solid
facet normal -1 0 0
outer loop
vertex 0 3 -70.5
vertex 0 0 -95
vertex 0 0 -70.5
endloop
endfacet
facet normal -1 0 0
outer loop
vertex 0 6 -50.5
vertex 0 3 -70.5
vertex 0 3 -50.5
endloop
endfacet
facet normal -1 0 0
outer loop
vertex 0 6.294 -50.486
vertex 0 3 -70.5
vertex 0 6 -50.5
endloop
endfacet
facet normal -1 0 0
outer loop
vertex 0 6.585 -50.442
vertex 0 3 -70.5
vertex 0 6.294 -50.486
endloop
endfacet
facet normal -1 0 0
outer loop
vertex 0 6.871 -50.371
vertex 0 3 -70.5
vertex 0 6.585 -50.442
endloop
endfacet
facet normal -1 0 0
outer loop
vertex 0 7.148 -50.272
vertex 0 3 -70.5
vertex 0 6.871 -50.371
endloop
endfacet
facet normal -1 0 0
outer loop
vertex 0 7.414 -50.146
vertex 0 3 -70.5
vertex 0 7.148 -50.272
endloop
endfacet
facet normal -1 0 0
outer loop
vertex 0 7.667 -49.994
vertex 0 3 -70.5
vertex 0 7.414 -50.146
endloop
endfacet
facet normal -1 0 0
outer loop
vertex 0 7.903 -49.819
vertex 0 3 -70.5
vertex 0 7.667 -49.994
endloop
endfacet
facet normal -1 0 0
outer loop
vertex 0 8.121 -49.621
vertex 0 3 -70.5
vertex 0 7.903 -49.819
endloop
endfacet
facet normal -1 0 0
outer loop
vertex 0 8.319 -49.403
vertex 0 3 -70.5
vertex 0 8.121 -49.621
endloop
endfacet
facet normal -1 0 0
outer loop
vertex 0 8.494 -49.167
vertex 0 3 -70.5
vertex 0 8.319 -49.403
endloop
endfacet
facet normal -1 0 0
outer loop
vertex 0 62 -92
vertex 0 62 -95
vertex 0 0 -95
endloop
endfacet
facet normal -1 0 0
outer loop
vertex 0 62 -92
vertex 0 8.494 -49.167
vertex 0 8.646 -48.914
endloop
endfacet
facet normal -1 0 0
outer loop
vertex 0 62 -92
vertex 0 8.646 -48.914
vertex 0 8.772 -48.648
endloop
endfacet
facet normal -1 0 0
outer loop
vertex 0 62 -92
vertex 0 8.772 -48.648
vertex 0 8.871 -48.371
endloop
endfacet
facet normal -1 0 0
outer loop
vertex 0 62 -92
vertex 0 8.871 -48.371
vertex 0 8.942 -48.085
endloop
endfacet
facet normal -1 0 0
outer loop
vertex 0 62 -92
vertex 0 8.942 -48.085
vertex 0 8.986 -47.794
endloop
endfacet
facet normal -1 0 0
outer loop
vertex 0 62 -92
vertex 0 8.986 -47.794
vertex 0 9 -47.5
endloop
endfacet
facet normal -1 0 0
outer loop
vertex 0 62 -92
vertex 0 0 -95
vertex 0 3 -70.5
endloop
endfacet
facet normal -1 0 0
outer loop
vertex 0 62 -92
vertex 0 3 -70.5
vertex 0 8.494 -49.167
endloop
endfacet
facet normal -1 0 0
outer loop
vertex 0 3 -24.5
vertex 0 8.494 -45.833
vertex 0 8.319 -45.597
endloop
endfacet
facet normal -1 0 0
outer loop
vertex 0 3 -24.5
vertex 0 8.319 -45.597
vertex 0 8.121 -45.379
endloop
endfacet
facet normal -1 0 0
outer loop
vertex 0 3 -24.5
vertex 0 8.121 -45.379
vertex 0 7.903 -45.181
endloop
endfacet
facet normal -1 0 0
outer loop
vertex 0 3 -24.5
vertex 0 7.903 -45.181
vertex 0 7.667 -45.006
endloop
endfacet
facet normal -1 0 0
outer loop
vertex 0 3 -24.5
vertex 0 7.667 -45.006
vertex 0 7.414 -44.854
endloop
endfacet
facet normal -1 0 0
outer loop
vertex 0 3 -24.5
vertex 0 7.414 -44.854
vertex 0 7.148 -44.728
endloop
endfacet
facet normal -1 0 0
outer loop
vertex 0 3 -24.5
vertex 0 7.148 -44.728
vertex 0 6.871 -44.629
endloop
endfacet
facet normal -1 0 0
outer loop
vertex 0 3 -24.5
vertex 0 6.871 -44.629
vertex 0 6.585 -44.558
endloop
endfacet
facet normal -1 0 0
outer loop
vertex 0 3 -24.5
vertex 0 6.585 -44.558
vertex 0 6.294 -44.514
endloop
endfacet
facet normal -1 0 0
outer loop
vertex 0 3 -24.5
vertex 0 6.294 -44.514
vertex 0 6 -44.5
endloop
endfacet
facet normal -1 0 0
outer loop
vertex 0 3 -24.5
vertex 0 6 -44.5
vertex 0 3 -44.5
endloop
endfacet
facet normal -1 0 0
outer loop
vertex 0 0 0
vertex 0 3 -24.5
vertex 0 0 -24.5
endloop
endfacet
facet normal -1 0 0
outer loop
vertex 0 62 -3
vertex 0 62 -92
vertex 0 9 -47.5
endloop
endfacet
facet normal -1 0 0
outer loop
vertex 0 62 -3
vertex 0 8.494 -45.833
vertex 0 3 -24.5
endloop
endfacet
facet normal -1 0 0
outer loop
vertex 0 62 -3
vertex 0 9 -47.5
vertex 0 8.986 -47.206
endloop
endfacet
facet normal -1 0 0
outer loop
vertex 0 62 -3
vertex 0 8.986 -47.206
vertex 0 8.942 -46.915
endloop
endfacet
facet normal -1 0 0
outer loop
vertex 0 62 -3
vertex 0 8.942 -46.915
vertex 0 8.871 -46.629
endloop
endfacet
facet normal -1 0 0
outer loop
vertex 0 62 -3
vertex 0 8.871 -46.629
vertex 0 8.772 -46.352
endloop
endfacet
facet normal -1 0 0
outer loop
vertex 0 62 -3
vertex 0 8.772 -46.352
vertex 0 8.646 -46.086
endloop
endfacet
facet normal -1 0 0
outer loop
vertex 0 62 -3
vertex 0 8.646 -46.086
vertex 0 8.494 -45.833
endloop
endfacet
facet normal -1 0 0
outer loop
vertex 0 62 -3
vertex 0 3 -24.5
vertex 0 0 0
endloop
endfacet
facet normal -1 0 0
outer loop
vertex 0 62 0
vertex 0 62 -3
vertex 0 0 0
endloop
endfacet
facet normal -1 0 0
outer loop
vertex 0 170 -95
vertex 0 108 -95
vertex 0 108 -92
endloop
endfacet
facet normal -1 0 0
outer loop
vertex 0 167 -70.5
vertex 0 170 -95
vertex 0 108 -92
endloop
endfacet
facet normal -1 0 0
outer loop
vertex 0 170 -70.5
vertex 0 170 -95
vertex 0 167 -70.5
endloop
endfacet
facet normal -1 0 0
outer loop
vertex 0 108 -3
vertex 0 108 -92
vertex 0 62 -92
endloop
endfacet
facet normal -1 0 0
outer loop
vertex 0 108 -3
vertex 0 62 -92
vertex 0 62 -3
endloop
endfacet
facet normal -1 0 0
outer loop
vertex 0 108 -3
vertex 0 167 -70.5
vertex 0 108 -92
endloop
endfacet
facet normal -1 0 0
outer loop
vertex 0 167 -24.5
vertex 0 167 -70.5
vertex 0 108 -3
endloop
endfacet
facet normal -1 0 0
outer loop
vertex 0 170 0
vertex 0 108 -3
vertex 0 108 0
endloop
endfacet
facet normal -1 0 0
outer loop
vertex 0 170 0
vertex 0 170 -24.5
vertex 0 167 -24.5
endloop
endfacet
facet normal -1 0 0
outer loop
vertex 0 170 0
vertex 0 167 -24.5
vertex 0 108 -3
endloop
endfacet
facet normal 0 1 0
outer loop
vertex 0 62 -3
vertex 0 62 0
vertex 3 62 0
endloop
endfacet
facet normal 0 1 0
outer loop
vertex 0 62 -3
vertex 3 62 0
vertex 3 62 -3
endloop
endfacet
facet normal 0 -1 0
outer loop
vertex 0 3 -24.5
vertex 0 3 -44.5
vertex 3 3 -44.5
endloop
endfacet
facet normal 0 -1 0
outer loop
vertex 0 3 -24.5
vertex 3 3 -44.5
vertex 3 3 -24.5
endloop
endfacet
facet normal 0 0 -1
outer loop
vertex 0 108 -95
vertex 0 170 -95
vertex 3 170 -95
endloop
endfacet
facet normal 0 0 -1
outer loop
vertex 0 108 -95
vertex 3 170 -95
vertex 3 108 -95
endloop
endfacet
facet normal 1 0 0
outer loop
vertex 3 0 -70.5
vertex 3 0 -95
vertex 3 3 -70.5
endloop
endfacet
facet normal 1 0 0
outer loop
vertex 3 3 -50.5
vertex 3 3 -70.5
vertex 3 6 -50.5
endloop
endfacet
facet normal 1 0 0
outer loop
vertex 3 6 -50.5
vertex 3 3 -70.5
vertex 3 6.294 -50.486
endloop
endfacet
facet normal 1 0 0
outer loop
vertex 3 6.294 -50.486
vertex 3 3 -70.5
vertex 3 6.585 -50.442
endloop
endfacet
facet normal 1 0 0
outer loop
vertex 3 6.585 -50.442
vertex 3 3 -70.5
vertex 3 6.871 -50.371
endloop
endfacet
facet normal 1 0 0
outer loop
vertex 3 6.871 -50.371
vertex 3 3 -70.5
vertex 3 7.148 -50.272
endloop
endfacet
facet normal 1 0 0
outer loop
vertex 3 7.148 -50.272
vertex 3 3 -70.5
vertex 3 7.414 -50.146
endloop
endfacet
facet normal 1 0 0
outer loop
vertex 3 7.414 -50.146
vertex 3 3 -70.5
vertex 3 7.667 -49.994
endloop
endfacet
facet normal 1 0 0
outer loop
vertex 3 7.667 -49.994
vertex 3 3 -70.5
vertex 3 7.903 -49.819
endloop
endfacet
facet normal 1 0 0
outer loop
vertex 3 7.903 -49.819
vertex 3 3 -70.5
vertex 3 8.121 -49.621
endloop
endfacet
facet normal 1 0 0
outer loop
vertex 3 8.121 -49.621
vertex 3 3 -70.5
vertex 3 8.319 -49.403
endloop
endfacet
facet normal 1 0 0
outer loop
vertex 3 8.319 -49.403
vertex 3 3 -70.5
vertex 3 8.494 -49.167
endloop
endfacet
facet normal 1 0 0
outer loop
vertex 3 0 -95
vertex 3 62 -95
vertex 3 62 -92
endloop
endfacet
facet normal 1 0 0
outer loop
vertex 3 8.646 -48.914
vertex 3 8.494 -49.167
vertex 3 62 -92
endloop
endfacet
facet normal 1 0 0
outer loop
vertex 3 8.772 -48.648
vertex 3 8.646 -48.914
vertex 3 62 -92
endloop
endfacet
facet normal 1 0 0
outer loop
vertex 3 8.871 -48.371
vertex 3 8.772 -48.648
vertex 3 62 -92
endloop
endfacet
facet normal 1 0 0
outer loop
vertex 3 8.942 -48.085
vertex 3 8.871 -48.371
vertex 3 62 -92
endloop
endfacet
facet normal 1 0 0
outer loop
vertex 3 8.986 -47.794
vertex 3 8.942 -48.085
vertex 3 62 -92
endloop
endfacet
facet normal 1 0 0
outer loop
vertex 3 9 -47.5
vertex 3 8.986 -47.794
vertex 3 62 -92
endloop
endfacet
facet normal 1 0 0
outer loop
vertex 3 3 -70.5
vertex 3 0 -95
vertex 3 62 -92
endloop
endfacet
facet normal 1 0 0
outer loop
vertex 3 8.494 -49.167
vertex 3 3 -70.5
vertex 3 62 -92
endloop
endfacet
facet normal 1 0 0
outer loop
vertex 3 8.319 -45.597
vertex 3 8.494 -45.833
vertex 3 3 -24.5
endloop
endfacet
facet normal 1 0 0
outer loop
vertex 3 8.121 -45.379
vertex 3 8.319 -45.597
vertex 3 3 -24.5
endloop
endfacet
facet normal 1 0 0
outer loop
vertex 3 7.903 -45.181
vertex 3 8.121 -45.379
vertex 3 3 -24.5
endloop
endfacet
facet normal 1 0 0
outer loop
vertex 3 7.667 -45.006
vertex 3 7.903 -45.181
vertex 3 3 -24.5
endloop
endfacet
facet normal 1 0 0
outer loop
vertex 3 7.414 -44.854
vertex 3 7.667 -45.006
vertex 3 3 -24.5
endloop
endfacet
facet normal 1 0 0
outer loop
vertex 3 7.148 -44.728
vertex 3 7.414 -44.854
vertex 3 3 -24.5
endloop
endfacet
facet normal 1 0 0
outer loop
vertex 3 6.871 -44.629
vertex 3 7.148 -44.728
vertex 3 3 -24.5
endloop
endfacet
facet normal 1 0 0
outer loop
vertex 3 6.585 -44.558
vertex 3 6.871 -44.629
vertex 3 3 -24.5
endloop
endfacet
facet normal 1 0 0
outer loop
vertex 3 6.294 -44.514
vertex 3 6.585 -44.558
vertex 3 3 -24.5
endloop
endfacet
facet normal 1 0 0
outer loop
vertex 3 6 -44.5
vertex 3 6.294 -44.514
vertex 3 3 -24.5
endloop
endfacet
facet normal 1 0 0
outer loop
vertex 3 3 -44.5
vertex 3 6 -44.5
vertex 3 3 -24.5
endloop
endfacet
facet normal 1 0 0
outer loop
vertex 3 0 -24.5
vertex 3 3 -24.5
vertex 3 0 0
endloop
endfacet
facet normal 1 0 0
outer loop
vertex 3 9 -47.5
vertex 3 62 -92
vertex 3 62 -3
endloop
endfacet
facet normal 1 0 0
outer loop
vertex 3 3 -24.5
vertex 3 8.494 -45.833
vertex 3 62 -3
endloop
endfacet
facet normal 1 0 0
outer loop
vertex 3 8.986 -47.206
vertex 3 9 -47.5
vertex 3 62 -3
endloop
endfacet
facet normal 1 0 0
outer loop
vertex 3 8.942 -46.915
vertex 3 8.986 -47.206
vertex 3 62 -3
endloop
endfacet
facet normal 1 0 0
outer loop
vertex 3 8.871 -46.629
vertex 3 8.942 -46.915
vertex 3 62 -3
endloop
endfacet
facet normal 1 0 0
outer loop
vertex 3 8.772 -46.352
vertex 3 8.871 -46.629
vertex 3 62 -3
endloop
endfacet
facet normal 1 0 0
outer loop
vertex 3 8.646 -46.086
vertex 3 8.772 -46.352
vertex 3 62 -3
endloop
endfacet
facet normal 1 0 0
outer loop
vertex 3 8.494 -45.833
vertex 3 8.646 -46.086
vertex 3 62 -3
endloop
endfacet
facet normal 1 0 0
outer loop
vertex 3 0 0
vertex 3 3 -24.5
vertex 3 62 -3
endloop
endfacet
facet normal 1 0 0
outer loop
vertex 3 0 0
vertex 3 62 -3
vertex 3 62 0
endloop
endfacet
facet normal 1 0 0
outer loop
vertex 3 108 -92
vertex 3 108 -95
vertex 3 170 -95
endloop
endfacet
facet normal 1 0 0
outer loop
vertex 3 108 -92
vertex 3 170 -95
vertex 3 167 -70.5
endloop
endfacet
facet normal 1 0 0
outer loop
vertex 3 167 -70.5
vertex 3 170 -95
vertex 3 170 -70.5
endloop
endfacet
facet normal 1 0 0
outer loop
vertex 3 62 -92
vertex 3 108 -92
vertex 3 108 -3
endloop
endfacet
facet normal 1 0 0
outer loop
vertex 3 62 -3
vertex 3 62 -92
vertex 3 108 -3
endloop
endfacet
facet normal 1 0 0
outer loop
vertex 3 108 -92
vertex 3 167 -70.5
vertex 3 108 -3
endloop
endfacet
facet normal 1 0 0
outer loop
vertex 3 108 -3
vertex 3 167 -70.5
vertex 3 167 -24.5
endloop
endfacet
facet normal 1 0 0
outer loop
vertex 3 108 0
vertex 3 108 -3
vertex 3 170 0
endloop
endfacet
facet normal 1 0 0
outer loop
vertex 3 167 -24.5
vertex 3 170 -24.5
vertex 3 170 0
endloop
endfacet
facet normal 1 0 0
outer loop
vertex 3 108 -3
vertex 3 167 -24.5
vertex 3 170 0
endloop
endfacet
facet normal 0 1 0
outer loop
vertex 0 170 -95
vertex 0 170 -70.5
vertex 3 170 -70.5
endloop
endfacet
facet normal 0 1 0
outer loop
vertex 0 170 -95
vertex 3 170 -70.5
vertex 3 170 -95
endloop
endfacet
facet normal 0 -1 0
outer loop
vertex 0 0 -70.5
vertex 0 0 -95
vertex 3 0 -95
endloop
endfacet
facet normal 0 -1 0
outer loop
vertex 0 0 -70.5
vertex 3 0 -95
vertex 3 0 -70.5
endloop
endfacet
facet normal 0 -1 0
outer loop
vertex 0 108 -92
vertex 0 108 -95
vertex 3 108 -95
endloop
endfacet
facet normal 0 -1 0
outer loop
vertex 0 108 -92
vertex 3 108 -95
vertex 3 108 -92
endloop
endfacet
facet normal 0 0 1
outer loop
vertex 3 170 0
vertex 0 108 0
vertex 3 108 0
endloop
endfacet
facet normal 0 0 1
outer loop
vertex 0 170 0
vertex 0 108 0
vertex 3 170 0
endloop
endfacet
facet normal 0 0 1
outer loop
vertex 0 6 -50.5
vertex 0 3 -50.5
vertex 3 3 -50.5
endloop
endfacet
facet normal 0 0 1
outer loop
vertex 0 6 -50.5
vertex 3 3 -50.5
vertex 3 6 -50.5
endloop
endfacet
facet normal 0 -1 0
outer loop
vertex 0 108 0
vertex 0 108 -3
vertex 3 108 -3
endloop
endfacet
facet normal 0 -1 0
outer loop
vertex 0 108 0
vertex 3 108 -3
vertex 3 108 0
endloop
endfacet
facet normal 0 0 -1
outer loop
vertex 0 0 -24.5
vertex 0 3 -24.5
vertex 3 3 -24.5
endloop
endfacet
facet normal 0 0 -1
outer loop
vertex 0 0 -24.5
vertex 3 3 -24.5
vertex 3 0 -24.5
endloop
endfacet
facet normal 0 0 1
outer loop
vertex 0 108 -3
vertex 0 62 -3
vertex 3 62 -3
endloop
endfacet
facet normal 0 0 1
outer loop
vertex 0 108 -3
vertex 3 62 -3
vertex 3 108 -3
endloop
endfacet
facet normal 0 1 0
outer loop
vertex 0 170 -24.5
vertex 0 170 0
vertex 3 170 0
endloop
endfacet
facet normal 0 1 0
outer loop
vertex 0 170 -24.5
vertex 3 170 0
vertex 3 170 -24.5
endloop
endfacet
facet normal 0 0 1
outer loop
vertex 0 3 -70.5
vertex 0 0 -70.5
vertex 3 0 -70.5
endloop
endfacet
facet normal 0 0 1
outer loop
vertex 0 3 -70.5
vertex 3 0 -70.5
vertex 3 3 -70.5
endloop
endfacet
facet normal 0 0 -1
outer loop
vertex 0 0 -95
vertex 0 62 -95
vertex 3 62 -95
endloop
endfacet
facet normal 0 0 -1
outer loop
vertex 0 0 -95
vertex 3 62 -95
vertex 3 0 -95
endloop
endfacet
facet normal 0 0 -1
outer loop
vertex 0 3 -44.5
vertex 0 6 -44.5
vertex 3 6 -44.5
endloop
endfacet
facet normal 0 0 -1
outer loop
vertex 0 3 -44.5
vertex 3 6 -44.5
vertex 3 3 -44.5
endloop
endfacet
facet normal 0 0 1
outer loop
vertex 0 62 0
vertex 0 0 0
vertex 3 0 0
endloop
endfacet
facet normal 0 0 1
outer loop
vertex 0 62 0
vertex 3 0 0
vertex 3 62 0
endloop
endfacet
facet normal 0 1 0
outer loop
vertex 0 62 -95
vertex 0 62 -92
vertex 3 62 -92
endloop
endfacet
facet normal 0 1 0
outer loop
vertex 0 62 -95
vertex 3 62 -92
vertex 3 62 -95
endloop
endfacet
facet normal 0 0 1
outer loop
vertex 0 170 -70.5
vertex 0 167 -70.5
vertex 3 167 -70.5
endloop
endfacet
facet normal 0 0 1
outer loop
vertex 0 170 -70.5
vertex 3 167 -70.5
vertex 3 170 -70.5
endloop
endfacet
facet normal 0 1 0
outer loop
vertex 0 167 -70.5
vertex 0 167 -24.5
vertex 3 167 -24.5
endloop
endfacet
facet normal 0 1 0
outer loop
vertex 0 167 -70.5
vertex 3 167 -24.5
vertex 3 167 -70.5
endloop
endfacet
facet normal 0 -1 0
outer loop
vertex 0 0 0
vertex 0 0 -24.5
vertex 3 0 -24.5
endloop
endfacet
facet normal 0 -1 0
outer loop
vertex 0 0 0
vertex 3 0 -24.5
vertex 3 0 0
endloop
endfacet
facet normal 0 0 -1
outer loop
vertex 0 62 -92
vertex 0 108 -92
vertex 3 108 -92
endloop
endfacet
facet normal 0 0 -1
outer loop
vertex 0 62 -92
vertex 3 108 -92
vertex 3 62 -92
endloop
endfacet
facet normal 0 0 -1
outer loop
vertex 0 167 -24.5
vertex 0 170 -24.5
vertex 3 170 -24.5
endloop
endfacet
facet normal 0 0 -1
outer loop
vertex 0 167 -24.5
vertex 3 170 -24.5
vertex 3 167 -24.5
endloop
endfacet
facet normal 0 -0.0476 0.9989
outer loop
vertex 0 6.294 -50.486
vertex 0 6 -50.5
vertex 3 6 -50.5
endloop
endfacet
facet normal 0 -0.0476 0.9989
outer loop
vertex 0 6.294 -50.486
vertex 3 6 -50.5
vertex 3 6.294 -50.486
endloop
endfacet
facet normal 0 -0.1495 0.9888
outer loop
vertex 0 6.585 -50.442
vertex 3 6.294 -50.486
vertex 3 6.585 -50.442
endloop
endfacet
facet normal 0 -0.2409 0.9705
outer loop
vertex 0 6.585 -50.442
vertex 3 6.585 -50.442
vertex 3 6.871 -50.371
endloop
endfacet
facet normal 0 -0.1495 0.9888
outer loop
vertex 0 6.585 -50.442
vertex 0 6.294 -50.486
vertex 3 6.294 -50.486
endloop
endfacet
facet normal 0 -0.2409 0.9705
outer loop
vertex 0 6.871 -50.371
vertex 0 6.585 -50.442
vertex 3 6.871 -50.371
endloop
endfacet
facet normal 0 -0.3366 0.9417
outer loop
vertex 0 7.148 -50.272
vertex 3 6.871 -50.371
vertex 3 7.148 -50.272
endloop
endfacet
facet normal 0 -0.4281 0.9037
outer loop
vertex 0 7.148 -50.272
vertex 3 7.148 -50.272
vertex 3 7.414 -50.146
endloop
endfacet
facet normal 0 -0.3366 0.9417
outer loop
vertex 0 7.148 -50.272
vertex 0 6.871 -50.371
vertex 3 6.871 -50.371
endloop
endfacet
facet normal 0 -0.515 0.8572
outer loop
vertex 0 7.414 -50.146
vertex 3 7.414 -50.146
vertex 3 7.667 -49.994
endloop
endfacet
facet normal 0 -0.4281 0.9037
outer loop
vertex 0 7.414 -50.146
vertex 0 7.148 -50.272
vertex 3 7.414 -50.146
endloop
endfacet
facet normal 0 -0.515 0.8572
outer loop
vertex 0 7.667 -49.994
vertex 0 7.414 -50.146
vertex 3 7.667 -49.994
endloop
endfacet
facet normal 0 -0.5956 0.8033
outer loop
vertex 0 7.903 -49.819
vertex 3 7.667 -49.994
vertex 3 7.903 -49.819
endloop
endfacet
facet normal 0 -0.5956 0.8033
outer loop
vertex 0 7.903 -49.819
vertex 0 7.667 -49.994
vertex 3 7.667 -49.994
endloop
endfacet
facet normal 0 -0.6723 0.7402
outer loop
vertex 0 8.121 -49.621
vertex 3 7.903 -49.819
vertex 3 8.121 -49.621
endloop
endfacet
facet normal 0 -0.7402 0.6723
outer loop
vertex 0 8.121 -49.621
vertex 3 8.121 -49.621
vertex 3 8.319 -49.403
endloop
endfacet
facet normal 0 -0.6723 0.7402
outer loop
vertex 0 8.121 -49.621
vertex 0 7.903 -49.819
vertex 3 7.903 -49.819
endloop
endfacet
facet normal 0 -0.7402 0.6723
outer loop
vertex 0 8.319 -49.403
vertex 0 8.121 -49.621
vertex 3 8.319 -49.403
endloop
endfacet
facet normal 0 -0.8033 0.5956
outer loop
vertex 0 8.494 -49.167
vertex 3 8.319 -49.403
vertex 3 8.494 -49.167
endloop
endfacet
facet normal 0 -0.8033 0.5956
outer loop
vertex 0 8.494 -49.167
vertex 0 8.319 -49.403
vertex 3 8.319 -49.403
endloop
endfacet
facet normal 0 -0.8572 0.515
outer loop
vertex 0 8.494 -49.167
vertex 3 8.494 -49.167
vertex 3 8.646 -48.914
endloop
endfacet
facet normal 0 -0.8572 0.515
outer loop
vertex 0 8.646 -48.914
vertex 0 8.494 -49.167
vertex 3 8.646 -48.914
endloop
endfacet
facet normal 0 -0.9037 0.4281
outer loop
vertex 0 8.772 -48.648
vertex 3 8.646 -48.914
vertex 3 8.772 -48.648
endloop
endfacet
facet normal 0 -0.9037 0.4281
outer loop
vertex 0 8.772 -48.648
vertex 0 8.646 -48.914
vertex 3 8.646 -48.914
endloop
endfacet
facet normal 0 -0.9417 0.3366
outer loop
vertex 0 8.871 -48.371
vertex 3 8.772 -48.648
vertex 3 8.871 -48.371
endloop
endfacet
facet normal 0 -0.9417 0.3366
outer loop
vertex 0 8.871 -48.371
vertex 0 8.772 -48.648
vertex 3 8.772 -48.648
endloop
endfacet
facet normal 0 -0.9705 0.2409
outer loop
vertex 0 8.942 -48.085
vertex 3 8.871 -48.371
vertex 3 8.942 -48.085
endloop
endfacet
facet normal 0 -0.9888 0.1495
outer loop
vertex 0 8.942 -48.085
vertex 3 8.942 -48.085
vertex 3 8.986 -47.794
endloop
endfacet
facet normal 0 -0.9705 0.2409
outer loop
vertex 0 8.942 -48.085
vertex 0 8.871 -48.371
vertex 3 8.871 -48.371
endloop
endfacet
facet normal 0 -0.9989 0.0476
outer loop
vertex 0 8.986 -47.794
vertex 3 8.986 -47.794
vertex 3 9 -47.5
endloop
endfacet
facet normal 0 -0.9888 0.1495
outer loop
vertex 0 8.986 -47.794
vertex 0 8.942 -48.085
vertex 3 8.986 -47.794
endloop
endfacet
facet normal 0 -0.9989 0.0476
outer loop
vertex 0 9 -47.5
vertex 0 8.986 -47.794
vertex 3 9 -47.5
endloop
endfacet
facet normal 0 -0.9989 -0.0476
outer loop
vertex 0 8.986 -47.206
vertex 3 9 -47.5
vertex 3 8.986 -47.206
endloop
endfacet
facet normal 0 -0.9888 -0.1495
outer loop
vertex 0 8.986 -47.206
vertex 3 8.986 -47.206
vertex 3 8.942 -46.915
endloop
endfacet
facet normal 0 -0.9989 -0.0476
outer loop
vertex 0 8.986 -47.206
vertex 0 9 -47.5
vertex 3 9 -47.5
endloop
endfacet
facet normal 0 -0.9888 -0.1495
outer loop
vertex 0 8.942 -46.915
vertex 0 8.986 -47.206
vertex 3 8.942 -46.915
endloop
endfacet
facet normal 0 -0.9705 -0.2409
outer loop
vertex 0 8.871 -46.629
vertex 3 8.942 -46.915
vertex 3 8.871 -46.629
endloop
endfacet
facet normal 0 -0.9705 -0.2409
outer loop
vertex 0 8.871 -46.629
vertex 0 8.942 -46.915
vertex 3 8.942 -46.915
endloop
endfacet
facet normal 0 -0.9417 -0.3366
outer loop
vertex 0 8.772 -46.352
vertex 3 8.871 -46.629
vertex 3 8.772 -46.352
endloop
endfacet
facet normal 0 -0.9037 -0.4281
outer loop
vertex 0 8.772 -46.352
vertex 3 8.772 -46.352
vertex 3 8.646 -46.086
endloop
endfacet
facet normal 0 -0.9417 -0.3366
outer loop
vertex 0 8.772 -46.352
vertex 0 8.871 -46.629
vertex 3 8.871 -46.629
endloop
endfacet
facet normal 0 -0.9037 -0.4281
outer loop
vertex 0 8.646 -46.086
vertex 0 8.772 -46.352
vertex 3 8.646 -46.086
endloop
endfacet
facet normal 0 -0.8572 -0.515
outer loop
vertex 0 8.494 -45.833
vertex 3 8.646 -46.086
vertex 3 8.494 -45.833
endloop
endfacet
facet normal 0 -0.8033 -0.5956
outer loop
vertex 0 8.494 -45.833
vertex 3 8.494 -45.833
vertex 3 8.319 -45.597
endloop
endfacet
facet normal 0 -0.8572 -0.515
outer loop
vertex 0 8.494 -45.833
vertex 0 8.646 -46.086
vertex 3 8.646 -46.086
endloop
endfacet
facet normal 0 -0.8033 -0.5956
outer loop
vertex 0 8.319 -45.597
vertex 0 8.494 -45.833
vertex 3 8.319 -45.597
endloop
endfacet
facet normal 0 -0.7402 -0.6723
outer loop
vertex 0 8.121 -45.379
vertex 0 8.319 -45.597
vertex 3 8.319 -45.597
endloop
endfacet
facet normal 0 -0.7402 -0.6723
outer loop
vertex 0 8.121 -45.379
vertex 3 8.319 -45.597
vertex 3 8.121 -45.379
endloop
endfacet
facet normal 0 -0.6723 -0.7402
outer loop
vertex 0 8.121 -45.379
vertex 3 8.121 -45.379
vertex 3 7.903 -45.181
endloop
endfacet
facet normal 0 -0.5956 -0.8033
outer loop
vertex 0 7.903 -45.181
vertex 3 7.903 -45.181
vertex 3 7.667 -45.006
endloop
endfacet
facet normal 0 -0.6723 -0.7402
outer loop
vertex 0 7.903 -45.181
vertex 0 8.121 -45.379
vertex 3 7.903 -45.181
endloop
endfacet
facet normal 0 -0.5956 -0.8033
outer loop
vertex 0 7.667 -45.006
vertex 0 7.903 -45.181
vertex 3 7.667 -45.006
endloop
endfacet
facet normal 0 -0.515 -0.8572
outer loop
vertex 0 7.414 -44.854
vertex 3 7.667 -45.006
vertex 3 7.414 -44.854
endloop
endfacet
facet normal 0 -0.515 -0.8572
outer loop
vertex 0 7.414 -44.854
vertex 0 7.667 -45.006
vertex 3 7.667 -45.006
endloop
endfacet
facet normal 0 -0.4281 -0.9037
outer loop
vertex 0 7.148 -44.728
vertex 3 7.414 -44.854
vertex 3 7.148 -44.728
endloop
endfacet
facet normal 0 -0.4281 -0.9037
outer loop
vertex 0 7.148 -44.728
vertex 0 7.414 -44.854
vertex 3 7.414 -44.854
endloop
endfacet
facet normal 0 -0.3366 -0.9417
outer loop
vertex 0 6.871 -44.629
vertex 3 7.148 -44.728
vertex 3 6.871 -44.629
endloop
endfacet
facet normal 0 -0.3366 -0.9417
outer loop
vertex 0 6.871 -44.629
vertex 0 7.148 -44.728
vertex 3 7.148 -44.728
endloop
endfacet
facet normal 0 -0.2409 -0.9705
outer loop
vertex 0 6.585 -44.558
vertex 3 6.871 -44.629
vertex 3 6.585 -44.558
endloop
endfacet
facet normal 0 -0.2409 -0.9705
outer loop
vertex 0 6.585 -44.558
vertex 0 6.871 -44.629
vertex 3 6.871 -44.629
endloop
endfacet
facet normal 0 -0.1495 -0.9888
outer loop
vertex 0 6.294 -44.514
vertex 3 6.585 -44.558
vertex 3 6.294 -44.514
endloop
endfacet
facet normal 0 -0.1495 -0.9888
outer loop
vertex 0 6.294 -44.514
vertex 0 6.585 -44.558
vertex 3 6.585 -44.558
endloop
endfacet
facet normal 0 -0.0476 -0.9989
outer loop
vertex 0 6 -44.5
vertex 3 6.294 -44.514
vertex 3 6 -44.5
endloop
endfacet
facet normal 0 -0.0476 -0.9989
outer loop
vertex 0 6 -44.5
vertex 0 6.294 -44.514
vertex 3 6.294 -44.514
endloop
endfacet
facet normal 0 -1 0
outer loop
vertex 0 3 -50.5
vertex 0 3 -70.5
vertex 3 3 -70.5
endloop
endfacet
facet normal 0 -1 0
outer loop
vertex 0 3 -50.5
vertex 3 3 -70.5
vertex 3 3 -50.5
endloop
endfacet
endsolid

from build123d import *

# Parameters (mm, degrees)
SALIENTE_EXTRUIR1_DEPTH = 3


with BuildPart() as part:
    # Croquis1 → Saliente-Extruir1 (new body)
    with BuildSketch(Plane(origin=(0, 0, 0), x_dir=(0, 0, -1), z_dir=(1, 0, 0))):
        with BuildLine():
            Line((24.5, 167), (70.5, 167))
            Line((70.5, 167), (70.5, 170))
            Line((70.5, 170), (95, 170))
            Line((95, 170), (95, 108))
            Line((95, 108), (92, 108))
            Line((92, 108), (92, 62))
            Line((92, 62), (95, 62))
            Line((95, 62), (95, 0))
            Line((95, 0), (70.5, 0))
            Line((70.5, 0), (70.5, 3))
            Line((70.5, 3), (50.5, 3))
            Line((50.5, 3), (50.5, 6))
            ThreePointArc((50.5, 6), (47.5, 9), (44.5, 6))
            Line((44.5, 6), (44.5, 3))
            Line((44.5, 3), (24.5, 3))
            Line((24.5, 3), (24.5, 0))
            Line((24.5, 0), (0, 0))
            Line((0, 0), (0, 62))
            Line((0, 62), (3, 62))
            Line((3, 62), (3, 108))
            Line((3, 108), (0, 108))
            Line((0, 108), (0, 170))
            Line((0, 170), (24.5, 170))
            Line((24.5, 170), (24.5, 167))
        make_face()
    extrude(amount=SALIENTE_EXTRUIR1_DEPTH)


solid = part.part
